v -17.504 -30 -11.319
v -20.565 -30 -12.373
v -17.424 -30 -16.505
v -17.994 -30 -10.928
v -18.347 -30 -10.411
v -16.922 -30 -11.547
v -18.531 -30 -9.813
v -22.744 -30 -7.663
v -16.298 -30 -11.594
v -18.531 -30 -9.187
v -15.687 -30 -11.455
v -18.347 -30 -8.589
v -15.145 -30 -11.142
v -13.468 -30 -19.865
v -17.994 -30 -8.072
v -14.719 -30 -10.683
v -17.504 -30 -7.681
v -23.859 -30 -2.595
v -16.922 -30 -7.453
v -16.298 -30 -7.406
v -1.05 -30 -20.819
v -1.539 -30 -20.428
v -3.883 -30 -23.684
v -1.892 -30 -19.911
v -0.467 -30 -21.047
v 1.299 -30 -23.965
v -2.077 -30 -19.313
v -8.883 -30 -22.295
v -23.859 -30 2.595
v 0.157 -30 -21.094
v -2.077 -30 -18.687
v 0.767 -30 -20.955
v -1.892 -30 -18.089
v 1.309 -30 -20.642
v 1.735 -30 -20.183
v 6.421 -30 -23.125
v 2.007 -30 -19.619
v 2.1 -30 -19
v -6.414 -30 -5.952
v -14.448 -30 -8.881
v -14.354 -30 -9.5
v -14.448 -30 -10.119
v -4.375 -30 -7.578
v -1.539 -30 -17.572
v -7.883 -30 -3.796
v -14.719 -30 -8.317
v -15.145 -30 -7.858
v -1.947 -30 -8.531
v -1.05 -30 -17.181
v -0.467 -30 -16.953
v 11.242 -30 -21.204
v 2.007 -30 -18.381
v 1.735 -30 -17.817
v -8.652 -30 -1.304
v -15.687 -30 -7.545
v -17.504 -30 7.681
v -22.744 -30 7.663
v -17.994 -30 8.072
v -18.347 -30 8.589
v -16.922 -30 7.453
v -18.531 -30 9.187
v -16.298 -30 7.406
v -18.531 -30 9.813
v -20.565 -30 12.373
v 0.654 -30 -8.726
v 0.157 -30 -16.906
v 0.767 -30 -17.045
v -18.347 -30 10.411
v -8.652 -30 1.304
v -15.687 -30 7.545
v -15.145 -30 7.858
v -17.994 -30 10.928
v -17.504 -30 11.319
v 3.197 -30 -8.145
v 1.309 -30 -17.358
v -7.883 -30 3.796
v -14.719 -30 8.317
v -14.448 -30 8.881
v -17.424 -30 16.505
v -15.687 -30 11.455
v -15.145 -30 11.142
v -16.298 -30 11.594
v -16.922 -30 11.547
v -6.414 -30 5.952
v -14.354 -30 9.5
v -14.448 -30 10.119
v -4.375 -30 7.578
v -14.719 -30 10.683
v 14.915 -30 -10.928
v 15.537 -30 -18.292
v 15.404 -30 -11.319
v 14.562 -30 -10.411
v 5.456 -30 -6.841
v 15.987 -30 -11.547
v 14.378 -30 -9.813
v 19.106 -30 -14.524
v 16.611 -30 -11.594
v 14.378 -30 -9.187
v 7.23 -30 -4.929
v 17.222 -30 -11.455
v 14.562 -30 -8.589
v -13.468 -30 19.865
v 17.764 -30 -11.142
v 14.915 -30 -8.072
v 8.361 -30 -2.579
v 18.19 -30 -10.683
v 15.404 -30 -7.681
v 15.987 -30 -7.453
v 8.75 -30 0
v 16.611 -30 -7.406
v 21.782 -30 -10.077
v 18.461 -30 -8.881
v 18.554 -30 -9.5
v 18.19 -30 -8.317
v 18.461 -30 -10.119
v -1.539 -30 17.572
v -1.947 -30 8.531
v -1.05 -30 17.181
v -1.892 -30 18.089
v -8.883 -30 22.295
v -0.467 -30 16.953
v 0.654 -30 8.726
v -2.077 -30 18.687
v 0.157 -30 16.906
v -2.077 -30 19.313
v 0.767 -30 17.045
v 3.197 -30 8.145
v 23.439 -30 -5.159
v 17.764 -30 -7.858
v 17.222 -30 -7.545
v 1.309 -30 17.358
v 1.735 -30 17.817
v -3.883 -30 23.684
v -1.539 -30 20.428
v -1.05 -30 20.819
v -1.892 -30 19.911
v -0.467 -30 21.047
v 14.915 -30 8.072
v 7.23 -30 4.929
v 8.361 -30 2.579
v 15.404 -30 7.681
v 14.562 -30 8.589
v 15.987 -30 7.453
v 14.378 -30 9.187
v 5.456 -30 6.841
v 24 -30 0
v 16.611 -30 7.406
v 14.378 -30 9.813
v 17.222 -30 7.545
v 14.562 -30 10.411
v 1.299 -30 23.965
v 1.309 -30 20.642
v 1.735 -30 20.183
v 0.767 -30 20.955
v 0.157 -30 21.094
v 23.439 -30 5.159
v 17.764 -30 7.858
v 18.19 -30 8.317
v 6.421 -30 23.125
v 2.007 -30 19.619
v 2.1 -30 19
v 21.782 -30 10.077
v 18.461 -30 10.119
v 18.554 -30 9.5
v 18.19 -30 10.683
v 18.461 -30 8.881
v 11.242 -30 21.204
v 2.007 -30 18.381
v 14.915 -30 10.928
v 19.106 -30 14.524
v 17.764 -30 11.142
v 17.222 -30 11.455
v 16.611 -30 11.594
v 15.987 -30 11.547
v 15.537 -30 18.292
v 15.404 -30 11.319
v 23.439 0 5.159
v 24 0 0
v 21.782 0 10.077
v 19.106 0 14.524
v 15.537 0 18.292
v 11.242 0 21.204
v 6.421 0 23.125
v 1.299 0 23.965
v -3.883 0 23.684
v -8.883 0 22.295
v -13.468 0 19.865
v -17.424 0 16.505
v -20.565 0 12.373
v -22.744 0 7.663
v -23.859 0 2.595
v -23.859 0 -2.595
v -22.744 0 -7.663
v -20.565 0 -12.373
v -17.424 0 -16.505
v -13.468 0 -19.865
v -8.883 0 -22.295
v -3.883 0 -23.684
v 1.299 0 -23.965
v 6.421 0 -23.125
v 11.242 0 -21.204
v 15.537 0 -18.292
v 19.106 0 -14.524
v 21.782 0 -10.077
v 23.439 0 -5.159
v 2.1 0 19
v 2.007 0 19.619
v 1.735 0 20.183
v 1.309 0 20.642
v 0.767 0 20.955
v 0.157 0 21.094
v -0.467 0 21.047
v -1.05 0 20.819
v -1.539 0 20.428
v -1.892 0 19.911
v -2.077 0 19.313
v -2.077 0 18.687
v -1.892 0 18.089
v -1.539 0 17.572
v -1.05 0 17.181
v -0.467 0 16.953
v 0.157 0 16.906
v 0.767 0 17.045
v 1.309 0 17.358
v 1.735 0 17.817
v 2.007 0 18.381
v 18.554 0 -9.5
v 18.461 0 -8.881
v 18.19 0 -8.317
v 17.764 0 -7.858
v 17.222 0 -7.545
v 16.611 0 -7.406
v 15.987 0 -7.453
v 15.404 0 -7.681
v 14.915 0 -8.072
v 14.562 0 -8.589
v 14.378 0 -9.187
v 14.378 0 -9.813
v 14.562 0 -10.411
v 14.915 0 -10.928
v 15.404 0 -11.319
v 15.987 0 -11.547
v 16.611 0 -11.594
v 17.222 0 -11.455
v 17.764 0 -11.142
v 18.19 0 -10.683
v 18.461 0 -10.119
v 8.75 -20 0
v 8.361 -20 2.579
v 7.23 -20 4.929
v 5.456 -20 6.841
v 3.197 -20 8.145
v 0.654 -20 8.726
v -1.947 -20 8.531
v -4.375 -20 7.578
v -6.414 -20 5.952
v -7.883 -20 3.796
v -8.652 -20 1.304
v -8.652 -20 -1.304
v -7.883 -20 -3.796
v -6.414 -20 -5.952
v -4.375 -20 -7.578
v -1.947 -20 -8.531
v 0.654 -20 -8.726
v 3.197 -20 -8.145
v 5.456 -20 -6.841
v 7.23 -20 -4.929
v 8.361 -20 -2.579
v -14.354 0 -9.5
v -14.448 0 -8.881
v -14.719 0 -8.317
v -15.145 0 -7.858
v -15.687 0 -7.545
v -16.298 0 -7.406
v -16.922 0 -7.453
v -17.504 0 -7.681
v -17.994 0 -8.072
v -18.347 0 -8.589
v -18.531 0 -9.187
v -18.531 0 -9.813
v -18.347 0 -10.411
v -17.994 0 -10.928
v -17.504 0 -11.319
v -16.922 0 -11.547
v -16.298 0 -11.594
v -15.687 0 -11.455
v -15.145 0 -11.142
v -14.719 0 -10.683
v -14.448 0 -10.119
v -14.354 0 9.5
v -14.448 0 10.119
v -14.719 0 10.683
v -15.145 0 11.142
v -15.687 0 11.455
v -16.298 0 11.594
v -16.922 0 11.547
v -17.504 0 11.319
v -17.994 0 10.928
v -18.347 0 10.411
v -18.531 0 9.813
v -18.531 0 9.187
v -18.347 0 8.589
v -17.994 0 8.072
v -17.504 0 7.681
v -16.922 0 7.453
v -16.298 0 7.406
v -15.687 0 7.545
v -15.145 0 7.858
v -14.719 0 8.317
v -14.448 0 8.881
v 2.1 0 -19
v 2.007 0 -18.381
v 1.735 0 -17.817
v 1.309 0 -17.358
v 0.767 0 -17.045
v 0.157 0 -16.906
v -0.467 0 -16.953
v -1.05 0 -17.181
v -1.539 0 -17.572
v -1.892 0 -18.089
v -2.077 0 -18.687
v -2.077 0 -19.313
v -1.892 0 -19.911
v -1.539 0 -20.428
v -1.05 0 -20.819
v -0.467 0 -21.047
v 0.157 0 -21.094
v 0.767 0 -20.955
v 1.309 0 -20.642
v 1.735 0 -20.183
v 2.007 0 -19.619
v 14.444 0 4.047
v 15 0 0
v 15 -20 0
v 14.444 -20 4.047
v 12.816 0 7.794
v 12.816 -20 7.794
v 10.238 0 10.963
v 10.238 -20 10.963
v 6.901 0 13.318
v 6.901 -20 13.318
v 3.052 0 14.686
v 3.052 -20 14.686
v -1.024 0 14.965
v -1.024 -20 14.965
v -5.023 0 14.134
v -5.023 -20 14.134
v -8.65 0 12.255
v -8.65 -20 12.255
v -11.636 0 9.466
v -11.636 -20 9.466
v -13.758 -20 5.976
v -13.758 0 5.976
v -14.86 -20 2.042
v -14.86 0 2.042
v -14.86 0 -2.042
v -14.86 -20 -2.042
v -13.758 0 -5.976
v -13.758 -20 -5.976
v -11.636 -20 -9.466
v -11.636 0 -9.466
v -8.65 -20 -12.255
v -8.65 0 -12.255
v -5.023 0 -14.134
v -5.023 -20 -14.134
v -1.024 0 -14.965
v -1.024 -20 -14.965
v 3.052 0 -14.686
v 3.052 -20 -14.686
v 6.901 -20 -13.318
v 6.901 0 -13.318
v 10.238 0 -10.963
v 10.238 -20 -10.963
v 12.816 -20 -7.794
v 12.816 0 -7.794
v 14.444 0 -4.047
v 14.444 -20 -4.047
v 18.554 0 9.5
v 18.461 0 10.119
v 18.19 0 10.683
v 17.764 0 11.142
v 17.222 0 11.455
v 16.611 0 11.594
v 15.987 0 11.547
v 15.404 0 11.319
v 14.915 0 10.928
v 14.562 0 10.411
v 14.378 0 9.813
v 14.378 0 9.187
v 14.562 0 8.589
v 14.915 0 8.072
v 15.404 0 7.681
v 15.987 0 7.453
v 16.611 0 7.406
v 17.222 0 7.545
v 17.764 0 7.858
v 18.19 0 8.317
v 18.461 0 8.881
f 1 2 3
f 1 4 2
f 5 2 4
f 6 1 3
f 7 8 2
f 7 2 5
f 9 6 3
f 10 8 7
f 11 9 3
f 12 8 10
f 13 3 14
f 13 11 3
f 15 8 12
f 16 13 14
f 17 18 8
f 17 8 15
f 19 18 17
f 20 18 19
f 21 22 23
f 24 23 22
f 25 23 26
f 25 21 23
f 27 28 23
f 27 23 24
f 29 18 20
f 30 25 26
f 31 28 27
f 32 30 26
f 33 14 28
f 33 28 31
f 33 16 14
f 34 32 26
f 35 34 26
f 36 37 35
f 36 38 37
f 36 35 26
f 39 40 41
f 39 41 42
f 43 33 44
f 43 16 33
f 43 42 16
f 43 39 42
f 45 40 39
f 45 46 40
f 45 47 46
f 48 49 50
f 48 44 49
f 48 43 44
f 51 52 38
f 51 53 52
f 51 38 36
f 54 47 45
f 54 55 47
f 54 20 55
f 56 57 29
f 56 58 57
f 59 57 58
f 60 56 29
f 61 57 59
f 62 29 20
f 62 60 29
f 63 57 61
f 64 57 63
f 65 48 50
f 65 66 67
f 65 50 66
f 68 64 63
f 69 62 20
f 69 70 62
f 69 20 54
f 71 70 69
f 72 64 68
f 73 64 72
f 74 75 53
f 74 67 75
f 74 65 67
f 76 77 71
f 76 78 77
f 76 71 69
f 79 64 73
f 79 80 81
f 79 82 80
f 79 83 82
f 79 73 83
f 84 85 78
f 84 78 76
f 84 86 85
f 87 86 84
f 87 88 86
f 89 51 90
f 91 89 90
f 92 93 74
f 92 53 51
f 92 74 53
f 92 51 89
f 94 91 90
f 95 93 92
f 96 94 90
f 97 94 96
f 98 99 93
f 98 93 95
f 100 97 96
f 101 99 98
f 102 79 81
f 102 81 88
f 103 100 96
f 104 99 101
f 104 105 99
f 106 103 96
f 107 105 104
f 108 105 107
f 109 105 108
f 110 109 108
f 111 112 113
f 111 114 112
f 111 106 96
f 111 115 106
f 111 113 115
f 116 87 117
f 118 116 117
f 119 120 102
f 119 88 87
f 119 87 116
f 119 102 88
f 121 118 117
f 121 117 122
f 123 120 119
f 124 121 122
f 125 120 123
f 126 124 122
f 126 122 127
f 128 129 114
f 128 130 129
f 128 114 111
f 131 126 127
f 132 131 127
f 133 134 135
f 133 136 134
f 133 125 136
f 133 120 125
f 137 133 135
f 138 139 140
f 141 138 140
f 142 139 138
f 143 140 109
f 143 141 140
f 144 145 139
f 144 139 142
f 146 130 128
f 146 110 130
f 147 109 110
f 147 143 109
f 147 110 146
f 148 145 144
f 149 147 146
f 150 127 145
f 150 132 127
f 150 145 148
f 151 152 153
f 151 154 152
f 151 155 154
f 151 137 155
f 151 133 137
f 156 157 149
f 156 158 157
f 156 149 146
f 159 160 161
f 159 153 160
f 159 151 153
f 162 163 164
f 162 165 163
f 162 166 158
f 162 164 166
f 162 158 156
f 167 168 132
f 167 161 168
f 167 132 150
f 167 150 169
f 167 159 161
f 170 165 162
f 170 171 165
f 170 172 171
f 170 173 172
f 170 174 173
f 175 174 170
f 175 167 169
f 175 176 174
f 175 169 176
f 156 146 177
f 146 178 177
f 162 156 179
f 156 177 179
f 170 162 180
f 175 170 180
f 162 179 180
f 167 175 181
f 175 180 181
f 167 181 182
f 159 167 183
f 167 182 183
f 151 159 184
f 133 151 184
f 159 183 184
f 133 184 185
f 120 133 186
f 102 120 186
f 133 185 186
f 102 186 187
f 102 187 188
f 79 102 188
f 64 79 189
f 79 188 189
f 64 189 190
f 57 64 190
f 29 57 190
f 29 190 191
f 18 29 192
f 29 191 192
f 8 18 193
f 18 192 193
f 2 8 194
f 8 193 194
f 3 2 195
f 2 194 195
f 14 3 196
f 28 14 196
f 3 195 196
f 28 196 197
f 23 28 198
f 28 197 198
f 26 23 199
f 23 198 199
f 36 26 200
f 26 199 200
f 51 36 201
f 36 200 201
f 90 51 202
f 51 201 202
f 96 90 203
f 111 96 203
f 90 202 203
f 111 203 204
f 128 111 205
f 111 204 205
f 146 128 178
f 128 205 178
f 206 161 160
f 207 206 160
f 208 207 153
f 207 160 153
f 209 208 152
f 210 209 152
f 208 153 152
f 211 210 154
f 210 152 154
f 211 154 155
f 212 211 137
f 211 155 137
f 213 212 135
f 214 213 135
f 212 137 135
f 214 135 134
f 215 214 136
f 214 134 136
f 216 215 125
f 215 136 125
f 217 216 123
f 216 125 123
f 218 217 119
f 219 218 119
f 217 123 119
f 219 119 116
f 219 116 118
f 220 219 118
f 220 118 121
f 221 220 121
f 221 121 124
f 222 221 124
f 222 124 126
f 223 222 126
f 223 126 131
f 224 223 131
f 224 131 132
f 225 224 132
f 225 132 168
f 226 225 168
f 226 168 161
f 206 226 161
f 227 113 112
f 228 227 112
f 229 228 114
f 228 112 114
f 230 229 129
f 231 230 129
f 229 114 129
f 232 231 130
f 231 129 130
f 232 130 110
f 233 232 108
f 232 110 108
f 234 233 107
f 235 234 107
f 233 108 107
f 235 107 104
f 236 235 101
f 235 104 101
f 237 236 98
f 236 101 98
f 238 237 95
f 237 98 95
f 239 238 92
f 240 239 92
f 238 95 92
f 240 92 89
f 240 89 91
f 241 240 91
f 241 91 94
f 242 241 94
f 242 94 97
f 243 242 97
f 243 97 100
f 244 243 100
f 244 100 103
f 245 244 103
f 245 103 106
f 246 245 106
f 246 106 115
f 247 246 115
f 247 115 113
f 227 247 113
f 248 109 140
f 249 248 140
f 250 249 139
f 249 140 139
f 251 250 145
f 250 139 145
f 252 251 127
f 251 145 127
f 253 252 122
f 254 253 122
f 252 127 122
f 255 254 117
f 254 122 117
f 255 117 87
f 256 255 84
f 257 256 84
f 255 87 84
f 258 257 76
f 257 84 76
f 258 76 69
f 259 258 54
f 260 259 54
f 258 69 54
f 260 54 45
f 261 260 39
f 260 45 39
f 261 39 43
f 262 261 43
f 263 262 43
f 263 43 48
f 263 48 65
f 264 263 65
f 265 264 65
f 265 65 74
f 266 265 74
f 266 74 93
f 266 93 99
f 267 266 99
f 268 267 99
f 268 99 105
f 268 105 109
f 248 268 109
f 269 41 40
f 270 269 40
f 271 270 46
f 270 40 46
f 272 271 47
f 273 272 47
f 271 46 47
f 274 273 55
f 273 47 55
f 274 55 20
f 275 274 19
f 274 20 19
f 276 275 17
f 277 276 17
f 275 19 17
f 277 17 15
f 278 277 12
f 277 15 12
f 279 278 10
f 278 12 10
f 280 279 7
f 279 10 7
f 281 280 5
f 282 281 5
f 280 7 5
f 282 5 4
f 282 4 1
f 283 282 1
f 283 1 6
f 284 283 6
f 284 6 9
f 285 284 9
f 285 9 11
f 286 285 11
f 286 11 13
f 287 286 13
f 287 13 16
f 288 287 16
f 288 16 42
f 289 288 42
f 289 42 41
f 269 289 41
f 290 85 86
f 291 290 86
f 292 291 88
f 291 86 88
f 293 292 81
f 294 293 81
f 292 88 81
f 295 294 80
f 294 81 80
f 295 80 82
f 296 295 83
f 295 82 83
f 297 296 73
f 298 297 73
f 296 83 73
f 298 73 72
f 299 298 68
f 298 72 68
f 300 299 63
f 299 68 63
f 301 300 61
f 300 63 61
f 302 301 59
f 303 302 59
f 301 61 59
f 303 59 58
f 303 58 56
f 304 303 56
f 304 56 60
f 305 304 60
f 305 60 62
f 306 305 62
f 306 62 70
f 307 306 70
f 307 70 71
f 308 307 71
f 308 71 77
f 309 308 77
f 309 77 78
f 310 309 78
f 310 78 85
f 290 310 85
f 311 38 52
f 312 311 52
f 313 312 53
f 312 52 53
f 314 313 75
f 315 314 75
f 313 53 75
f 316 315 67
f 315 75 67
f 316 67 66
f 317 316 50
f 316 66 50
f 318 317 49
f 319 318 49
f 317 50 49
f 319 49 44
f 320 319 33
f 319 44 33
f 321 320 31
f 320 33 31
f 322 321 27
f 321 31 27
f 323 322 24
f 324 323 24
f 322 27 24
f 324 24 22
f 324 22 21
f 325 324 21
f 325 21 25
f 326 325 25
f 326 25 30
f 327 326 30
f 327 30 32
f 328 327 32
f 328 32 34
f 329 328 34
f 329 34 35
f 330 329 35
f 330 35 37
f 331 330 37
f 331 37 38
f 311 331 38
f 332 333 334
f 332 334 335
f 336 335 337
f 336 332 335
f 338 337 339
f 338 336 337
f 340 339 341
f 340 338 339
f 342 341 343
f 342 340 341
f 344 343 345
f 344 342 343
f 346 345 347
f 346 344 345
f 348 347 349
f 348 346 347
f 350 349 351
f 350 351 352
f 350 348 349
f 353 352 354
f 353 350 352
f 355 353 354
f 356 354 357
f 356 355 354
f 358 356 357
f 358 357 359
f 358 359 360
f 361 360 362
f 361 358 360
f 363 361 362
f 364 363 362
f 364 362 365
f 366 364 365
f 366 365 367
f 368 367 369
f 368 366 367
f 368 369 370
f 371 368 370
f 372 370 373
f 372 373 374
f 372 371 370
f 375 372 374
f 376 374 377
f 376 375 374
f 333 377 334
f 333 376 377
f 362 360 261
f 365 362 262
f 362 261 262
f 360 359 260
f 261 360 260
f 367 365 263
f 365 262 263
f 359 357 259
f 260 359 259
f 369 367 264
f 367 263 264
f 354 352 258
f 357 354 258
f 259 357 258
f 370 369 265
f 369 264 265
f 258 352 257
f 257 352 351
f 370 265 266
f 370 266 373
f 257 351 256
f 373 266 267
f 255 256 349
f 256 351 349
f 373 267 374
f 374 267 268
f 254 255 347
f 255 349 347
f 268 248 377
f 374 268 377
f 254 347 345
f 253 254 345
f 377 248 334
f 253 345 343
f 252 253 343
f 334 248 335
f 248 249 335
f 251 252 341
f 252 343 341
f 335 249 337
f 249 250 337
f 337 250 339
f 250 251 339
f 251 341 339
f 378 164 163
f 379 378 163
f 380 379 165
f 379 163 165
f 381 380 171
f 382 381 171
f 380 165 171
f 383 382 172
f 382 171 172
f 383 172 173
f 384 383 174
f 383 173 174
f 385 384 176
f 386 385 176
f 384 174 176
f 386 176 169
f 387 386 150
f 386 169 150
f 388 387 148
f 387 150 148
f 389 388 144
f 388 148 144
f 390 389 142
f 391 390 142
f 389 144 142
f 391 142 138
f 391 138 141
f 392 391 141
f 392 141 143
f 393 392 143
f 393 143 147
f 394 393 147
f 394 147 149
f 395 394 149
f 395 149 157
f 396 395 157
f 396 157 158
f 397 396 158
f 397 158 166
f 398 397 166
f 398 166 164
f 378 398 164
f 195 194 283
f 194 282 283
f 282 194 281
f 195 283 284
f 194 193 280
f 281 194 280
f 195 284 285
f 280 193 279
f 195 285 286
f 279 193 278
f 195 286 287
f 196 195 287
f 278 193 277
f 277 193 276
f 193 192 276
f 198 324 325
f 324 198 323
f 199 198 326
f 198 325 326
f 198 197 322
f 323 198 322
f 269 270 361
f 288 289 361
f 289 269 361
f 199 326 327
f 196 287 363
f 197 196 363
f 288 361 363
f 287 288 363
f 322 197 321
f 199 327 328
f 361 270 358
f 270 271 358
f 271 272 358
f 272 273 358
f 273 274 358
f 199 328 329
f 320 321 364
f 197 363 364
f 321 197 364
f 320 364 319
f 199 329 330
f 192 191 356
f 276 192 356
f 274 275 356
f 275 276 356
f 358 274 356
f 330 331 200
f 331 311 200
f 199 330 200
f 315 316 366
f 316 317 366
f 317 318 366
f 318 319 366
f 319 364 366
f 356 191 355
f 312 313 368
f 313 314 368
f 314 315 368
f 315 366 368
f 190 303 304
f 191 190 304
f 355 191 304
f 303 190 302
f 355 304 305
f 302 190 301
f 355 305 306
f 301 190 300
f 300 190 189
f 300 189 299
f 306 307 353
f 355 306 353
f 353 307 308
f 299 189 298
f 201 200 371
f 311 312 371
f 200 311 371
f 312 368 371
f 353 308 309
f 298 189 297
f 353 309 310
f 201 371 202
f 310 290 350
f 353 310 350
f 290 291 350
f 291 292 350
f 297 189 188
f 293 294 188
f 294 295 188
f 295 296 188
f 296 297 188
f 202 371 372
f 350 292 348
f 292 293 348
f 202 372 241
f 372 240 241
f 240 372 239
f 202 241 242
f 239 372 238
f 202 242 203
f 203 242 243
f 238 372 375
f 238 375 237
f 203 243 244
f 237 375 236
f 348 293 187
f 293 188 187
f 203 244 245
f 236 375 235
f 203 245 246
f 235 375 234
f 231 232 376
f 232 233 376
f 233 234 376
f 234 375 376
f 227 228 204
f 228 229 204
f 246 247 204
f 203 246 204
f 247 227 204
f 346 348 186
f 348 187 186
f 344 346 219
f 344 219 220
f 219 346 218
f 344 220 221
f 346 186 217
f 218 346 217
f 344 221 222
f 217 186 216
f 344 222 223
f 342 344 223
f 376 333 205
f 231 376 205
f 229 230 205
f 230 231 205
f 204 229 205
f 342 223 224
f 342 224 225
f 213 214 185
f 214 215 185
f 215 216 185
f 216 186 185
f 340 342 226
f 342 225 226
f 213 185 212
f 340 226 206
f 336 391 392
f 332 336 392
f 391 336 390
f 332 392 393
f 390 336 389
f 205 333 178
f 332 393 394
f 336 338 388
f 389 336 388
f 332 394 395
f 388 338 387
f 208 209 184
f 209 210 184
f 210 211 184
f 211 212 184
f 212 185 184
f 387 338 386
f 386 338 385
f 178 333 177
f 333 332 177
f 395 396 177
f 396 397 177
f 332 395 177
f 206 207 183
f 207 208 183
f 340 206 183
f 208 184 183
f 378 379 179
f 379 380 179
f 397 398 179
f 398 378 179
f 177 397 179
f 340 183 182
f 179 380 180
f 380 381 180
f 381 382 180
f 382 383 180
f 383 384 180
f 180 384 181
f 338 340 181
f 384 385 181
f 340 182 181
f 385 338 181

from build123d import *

# Parameters (mm, degrees)
F0_R     = 24
F0_R_2   = 15
F1_DEPTH = 20
F2_R     = 24
F3_DEPTH = 10
F5_D     = 4.2
F6_D     = 17.5


with BuildPart() as f1:
    # F0 (on Front) → F1 (new body)
    with BuildSketch(Plane.XZ):
        Circle(F0_R)
        Circle(F0_R_2, mode=Mode.SUBTRACT)
    extrude(amount=F1_DEPTH)

    # F2 (on face) → F3 (join)
    with BuildSketch(Plane.XZ.offset(20)):
        Circle(F2_R)
    extrude(amount=F3_DEPTH)

    # F5 (through all)
    with Locations(Plane(origin=(0, 0, 0), x_dir=(-1, 0, 0), z_dir=(0, 1, 0))):
        with Locations((0, 19), (16.4544826719, 9.5), (16.4544826719, -9.5), (0, -19), (-16.4544826719, -9.5), (-16.4544826719, 9.5)):
            Hole(F5_D / 2)

    # F6 (through all)
    with Locations(Plane(origin=(0, 0, 0), x_dir=(-1, 0, 0), z_dir=(0, 1, 0))):
        with Locations((0, 0)):
            Hole(F6_D / 2)


solid = f1.part
